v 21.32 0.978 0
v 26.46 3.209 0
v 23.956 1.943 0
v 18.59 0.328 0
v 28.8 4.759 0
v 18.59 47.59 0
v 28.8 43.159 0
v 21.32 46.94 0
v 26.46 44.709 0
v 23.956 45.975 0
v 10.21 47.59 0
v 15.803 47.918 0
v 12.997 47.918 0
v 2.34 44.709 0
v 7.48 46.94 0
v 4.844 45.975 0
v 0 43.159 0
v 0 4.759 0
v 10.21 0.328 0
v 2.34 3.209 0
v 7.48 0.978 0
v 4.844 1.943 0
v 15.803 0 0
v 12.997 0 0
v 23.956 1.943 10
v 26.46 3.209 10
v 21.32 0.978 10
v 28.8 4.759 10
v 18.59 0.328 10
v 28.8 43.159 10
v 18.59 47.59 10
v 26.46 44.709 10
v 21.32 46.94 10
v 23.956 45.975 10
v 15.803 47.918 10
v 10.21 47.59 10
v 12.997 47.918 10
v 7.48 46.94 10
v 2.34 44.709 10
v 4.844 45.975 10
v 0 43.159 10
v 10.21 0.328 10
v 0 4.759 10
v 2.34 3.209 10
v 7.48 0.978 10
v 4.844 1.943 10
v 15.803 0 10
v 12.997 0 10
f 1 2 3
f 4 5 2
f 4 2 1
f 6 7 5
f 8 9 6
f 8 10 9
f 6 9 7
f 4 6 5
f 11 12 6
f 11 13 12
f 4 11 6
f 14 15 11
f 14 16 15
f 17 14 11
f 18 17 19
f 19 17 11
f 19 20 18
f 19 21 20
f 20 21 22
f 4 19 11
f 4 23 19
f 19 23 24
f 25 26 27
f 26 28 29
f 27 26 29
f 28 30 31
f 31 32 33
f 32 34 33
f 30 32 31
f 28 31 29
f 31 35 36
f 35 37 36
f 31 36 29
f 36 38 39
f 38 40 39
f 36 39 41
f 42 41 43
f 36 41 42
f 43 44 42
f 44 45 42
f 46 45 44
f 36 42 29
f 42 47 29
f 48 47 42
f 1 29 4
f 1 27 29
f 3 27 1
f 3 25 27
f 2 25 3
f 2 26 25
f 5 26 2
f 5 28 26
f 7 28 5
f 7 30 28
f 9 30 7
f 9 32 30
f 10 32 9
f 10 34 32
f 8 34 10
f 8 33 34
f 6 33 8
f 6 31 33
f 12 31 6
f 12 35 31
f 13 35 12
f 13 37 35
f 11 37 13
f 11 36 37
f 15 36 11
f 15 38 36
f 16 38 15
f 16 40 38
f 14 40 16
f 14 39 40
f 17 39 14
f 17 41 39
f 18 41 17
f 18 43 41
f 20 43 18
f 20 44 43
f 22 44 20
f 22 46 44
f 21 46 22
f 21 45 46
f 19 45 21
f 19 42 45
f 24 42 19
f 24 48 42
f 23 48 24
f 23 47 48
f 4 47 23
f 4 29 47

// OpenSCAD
$fn = 32;

// ----------------------------------------------------------------------
// Eccentric disc: double_d, 10 mm thick
// ----------------------------------------------------------------------

// --- parameters (mm) ---
profile_height = 10;      // extrusion height
profile_points = 24;      // points of the closed outline

profile = [[28.8, 43.159], [26.46, 44.709], [23.956, 45.975], [21.32, 46.94], [18.59, 47.59], [15.803, 47.918], [12.997, 47.918], [10.21, 47.59], [7.48, 46.94], [4.844, 45.975], [2.34, 44.709], [0, 43.159], [0, 4.759], [2.34, 3.209], [4.844, 1.943], [7.48, 0.978], [10.21, 0.328], [12.997, 0], [15.803, 0], [18.59, 0.328], [21.32, 0.978], [23.956, 1.943], [26.46, 3.209], [28.8, 4.759]];  // single closed polygon, 24 points, counter clockwise

// --- the one profile operation ---
linear_extrude(height = profile_height) polygon(points = profile);
